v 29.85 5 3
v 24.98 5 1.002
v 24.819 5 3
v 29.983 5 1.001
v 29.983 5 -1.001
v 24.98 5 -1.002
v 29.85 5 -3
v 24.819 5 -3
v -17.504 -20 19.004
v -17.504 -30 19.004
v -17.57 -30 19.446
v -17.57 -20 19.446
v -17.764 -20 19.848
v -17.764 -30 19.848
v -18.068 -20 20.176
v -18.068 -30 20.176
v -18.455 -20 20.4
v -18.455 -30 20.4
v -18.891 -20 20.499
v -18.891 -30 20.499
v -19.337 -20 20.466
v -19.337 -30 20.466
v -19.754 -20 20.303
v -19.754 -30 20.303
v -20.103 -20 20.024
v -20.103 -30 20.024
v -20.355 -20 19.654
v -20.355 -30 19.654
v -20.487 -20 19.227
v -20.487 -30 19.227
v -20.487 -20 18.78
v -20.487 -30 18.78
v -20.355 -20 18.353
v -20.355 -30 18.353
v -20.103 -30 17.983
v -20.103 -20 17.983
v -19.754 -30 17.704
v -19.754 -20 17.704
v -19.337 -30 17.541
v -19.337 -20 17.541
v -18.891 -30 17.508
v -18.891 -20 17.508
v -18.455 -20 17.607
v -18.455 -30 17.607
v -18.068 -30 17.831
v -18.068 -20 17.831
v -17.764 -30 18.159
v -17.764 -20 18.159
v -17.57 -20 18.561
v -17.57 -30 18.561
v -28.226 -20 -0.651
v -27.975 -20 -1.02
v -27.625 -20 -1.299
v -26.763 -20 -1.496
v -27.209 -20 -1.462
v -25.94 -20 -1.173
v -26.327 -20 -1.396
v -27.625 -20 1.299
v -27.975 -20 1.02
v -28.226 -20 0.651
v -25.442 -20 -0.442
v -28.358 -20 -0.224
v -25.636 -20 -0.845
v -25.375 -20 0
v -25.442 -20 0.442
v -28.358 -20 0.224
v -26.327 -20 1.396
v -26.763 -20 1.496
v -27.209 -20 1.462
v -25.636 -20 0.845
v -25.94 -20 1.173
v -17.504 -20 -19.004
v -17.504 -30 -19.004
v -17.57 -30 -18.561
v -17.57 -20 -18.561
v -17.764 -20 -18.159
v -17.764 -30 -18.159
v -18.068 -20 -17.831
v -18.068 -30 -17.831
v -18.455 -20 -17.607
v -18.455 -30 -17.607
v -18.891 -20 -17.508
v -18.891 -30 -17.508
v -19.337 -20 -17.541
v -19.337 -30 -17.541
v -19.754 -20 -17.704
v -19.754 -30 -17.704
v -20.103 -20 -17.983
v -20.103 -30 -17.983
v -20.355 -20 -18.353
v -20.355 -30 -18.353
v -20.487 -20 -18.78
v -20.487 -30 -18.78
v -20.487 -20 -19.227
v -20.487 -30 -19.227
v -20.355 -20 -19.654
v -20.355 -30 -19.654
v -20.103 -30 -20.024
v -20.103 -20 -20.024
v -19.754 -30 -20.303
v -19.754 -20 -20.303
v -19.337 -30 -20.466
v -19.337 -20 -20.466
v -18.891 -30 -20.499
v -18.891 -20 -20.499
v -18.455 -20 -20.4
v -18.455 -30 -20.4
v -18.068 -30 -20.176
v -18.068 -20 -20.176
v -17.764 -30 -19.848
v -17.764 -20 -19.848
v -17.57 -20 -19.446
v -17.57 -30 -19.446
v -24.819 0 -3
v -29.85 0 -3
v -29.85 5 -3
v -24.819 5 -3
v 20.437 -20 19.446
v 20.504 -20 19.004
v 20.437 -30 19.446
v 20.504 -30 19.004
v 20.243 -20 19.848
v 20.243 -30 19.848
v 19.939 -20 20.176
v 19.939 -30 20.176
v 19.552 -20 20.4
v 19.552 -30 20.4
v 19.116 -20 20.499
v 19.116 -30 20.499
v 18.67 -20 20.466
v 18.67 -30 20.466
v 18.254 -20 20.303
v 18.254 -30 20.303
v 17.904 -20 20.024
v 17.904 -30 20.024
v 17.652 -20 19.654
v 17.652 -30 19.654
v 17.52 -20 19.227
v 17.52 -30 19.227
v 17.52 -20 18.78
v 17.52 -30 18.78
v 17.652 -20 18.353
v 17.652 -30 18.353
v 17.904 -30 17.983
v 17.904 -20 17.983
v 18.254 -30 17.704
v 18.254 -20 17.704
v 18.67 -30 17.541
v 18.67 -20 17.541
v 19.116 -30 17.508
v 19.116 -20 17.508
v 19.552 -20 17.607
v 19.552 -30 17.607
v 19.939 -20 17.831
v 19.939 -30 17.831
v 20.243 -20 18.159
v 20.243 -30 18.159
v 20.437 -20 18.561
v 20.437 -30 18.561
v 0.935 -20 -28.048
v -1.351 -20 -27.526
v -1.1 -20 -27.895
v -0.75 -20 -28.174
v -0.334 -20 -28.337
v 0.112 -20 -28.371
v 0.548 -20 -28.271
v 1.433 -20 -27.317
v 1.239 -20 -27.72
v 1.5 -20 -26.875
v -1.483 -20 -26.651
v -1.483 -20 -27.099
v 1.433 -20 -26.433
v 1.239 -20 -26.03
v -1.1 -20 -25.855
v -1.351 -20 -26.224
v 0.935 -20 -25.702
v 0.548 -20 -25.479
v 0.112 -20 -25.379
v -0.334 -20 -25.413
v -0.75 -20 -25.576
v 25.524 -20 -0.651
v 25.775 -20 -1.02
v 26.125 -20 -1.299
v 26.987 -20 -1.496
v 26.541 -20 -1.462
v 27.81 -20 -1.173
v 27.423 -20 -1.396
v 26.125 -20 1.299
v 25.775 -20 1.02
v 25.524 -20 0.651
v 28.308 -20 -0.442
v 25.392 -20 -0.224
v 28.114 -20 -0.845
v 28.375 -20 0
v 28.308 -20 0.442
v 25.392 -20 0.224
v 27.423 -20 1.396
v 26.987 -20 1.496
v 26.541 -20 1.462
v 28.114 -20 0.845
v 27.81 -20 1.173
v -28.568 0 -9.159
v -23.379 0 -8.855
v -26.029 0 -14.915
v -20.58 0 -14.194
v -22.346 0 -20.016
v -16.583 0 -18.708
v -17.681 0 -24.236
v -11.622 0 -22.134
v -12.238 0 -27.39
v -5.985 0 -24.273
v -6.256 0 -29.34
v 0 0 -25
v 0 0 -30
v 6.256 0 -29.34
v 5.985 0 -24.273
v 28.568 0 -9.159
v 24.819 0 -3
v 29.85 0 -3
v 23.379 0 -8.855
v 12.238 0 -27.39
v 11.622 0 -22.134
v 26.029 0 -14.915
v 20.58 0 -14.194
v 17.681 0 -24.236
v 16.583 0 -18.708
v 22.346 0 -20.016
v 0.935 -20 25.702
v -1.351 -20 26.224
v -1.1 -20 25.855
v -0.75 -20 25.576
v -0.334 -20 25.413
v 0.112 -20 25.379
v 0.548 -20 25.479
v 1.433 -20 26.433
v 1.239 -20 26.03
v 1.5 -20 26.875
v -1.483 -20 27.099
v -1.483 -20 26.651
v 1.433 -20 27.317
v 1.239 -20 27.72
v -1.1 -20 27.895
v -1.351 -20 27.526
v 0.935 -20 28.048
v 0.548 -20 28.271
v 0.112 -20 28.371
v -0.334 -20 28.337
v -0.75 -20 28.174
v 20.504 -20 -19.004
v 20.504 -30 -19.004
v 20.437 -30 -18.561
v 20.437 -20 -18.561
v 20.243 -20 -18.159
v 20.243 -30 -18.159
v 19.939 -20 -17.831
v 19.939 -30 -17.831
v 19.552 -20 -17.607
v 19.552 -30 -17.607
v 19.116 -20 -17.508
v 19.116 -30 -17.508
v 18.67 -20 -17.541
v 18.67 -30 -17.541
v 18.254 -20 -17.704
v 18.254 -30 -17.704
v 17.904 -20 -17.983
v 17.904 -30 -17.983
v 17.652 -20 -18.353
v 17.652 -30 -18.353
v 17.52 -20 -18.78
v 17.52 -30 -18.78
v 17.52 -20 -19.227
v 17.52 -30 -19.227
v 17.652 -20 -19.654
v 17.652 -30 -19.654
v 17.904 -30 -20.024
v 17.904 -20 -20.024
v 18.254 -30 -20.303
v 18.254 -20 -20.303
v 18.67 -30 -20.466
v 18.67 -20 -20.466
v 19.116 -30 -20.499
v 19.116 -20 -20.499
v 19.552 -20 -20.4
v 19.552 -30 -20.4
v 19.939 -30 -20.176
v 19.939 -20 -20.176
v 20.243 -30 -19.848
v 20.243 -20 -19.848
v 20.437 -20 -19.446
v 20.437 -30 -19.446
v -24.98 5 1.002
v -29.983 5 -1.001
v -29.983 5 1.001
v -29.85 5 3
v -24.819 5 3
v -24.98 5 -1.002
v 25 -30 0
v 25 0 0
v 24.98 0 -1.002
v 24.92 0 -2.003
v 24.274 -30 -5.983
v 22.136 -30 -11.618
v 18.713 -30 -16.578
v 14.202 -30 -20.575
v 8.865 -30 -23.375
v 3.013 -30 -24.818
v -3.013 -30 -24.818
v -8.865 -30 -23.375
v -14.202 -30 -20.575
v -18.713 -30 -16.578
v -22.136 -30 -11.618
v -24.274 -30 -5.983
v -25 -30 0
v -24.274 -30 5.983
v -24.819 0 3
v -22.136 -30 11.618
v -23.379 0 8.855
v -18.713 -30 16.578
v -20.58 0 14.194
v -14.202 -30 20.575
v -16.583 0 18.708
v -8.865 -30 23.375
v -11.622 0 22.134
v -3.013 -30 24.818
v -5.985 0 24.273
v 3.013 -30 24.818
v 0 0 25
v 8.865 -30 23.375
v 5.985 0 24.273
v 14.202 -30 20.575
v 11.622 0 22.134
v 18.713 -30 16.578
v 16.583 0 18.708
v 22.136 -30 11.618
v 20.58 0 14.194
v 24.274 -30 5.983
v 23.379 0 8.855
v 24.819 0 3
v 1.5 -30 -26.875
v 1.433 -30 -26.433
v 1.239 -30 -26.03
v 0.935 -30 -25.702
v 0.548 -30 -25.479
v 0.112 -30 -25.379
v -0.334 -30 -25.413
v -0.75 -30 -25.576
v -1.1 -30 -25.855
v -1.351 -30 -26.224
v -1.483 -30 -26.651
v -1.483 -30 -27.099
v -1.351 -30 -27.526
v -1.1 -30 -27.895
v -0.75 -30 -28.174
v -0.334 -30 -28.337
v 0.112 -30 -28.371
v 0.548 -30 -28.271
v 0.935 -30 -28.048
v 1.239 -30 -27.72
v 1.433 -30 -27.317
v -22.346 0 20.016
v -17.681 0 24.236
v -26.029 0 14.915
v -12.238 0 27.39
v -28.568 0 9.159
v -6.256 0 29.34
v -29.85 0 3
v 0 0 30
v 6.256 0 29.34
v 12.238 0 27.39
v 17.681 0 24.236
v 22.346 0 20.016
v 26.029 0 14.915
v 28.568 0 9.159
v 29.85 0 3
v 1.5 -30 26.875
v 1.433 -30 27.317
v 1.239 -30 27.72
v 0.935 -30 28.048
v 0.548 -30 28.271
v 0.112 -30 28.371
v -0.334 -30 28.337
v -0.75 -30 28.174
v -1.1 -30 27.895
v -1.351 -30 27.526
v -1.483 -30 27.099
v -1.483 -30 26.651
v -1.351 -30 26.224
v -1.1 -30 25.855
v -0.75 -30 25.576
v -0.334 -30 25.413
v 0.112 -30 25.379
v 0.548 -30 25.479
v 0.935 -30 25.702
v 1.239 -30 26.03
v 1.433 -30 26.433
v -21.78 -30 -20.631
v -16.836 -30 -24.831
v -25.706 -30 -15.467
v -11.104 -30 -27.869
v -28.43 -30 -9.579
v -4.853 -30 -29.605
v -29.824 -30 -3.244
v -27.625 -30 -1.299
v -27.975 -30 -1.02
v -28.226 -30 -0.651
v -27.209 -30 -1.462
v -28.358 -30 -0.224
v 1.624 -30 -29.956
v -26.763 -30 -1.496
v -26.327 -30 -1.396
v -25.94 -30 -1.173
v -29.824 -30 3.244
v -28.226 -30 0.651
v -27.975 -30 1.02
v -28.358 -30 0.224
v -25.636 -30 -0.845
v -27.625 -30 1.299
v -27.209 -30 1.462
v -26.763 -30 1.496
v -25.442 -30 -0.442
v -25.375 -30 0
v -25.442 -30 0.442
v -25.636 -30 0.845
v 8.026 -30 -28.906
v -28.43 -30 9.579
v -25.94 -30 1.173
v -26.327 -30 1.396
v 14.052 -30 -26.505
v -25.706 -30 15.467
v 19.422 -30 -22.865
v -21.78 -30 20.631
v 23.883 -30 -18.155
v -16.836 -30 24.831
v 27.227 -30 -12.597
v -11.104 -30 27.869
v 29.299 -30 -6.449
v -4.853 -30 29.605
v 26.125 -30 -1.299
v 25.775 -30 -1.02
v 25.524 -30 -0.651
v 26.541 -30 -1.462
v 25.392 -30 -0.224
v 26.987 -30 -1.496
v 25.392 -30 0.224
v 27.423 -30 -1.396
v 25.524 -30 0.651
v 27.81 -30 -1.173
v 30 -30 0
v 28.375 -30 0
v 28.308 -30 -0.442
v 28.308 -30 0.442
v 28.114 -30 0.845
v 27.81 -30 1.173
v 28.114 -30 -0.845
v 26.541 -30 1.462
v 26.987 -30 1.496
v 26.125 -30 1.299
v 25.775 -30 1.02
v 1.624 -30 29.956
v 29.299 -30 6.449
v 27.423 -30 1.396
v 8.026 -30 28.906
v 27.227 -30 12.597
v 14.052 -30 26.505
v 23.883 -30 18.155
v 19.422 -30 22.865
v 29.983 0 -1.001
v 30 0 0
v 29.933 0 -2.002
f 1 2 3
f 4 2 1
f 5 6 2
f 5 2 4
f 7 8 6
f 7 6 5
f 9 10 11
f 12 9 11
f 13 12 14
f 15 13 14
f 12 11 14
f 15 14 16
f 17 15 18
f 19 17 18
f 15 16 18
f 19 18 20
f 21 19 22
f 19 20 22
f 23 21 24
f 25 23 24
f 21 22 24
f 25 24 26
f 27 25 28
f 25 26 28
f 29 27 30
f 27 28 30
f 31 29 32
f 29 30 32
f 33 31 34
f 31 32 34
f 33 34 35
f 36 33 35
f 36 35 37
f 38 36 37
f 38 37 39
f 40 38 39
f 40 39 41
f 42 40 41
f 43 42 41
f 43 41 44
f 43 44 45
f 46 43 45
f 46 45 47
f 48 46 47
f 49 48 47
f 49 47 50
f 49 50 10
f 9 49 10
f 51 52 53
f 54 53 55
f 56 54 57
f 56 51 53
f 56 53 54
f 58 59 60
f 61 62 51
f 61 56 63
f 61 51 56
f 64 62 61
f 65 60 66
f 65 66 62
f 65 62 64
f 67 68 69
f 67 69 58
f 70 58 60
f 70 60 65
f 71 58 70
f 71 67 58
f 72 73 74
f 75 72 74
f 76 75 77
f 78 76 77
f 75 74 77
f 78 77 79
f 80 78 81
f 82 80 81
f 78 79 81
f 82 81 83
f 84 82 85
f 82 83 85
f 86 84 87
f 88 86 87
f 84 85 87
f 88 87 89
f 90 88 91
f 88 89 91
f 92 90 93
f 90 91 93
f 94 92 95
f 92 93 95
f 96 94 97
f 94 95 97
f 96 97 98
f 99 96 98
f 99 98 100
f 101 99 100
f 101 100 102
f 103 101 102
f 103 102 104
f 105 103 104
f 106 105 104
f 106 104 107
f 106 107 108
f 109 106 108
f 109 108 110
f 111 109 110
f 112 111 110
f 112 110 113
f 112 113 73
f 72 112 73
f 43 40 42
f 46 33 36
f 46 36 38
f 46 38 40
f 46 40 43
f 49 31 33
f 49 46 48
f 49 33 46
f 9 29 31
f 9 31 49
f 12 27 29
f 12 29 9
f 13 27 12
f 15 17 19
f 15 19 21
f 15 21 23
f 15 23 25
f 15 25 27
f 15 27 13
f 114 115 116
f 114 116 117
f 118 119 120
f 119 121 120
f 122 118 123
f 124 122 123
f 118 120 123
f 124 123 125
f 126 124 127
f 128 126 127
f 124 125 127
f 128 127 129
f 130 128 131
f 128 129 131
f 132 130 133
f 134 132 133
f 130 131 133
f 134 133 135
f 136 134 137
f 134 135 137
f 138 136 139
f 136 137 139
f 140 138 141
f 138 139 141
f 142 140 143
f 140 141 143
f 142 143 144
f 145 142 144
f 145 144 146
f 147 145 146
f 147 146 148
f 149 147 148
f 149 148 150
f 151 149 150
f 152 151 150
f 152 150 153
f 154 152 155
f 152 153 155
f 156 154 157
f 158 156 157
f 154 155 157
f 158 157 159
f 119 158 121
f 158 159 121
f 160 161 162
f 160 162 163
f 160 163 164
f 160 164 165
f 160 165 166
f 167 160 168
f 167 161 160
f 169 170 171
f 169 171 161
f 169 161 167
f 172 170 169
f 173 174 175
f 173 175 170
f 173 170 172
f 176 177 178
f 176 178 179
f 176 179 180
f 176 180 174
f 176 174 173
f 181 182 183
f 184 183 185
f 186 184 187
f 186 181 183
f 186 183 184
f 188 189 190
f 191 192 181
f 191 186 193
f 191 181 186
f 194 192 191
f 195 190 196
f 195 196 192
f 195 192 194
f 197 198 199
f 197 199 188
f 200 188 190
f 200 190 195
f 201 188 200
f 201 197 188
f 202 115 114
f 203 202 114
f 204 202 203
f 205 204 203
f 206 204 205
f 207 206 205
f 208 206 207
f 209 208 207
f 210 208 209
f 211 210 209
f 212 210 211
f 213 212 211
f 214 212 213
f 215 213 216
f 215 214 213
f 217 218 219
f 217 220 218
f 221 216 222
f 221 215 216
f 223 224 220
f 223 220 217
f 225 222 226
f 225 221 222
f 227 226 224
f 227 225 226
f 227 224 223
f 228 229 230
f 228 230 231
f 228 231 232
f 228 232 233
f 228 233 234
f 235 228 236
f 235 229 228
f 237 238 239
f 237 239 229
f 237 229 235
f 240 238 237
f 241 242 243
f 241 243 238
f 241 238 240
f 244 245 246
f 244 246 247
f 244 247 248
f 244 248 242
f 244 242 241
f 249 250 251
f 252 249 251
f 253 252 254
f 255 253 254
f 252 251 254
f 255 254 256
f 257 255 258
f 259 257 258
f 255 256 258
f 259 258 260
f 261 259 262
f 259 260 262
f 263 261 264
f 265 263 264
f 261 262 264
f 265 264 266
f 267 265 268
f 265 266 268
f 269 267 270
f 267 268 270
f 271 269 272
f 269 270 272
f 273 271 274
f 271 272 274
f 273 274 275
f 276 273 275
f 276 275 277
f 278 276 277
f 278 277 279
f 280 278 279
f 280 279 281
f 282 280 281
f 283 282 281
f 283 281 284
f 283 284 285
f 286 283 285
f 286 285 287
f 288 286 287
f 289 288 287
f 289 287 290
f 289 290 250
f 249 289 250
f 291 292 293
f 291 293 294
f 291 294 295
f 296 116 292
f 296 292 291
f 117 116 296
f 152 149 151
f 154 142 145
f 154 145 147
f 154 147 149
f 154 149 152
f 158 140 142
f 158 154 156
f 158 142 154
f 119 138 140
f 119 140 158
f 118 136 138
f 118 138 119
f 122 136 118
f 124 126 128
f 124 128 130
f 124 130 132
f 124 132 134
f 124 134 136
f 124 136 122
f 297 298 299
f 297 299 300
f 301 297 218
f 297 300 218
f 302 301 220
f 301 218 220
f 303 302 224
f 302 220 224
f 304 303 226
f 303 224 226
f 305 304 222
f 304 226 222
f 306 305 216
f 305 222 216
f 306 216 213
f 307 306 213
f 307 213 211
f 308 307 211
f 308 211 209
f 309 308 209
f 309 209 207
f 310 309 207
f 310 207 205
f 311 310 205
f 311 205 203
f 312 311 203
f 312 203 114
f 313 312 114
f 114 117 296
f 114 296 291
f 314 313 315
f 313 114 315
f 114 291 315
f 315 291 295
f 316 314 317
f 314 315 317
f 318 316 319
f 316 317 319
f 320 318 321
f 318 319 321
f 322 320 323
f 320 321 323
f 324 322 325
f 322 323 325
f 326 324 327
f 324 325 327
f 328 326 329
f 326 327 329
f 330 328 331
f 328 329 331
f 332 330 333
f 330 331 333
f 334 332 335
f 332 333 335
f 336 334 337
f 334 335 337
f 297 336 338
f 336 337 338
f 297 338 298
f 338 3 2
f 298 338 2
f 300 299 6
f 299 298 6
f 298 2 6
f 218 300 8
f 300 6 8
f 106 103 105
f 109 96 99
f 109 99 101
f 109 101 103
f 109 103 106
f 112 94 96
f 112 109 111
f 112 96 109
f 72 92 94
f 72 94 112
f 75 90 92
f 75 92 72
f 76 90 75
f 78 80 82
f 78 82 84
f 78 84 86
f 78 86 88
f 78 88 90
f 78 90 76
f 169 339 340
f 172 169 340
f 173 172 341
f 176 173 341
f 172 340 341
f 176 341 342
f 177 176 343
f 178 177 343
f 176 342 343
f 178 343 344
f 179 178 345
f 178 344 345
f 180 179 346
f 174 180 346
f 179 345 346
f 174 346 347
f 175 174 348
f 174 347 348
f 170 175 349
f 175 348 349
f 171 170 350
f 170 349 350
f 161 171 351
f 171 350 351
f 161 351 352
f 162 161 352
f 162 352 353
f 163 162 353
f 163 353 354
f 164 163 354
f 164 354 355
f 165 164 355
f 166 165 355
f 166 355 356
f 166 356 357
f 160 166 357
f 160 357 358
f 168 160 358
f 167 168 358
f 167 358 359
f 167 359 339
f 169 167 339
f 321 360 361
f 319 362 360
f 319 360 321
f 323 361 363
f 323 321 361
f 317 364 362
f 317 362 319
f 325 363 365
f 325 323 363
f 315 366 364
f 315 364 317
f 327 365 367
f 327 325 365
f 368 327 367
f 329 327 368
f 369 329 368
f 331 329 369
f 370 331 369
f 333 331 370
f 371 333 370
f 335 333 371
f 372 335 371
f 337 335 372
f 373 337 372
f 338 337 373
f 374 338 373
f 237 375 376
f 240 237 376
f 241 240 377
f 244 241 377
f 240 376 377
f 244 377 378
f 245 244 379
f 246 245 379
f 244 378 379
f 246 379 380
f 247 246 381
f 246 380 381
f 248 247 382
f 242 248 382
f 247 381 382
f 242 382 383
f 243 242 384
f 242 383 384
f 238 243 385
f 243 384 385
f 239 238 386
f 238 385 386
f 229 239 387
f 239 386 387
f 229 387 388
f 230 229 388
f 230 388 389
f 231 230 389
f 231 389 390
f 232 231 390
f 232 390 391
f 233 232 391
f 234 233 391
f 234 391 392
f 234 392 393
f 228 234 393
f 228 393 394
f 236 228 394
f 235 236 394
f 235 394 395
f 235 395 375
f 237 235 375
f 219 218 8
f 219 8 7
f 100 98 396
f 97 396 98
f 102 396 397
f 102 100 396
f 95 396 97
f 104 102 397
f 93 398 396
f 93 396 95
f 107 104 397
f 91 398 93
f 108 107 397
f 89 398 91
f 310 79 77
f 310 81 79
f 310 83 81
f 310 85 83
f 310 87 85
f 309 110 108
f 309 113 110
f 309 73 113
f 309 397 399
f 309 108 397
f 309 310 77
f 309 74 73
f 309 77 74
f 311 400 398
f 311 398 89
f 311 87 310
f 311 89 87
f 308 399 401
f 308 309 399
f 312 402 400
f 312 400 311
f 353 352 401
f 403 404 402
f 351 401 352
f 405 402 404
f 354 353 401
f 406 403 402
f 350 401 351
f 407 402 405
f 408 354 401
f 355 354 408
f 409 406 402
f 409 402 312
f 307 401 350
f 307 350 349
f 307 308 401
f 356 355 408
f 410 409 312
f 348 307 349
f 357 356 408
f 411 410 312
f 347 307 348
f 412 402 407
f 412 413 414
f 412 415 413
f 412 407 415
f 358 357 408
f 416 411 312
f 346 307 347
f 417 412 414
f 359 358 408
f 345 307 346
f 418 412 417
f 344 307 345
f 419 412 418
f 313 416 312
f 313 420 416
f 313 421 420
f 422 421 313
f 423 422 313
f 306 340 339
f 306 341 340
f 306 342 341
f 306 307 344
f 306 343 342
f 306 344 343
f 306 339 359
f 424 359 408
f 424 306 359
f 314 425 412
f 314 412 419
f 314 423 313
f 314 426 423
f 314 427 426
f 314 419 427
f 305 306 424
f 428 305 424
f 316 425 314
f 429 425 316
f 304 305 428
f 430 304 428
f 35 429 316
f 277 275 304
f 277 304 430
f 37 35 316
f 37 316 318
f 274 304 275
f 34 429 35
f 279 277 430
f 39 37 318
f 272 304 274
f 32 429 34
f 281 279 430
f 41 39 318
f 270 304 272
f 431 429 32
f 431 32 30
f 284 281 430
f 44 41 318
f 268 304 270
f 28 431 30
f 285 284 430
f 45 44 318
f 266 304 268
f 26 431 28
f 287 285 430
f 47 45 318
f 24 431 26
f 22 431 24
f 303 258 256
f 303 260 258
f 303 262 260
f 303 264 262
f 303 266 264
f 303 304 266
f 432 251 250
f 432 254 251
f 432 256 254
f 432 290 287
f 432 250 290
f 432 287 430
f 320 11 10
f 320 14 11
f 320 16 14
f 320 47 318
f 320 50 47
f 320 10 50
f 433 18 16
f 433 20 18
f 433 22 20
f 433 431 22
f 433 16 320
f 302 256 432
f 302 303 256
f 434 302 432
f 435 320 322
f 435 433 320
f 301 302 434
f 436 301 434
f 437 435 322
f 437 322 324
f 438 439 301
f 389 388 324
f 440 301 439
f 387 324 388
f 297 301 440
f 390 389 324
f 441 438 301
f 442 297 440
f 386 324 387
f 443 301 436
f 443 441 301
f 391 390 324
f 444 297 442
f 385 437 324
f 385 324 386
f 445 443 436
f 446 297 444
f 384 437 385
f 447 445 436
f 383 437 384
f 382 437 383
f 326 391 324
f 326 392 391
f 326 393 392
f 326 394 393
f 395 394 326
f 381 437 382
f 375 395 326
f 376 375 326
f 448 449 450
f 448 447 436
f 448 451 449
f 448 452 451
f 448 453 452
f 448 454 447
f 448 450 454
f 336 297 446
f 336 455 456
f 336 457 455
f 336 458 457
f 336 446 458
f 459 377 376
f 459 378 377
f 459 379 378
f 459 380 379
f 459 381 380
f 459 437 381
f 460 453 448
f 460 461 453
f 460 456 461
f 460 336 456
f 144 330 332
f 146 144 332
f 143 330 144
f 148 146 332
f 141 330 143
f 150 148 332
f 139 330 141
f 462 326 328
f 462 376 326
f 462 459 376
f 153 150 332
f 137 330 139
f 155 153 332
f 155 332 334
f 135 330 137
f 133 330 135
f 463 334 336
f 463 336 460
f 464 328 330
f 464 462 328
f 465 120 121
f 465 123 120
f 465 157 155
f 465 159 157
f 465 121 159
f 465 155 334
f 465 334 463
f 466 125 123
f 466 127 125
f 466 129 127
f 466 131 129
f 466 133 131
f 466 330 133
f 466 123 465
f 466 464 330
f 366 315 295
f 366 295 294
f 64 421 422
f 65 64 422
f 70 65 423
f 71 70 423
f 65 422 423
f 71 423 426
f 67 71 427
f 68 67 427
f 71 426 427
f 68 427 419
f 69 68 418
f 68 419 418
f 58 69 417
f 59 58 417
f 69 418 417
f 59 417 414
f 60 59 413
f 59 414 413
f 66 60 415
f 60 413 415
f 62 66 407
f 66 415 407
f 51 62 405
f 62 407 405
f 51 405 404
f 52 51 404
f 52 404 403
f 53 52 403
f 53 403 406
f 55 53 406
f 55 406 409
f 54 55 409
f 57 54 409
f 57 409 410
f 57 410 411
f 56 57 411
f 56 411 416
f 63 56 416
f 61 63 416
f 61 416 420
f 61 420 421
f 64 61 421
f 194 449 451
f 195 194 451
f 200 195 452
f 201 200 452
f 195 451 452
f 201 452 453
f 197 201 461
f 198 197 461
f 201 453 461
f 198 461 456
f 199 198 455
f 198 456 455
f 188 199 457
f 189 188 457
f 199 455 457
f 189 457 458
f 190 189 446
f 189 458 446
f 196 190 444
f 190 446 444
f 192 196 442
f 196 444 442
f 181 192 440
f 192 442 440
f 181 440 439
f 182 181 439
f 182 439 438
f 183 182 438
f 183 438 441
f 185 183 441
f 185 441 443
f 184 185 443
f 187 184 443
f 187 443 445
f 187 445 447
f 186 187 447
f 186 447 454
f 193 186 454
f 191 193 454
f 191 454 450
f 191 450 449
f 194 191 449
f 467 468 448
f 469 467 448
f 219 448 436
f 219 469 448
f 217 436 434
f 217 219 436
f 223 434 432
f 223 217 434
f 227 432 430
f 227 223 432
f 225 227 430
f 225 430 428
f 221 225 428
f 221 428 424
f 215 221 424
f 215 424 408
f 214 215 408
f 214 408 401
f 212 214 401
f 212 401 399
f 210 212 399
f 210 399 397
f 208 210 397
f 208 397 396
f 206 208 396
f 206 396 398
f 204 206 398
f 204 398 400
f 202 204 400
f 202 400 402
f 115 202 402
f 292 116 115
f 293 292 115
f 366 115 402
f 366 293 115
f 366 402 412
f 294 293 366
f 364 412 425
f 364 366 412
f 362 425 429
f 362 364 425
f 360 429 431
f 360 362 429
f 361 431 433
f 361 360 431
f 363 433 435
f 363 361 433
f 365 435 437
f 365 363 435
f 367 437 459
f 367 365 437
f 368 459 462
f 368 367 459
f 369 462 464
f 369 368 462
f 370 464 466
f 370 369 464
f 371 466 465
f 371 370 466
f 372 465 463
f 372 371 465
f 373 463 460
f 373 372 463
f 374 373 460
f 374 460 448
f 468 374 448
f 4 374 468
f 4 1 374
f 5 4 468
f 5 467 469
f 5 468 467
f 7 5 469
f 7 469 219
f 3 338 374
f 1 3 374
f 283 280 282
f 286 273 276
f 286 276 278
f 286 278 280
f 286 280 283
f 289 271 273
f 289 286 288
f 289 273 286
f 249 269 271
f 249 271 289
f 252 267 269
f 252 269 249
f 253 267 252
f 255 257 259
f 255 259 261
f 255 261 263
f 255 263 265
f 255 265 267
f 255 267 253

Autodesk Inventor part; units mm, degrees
ref_plane "YZ Plane" through (0, 0, 0) normal (1, 0, 0) x (0, 1, 0)
ref_plane "XZ Plane" through (0, 0, 0) normal (0, 1, 0) x (-1, 0, 0)
ref_plane "XY Plane" through (0, 0, 0) normal (0, 0, 1) x (1, 0, 0)
sketch "Sketch1" plane through (0, 0, 0) normal (0, 1, 0) x (-1, 0, 0)
  line L0 (0, 0) -> (50, 0) construction
  line L1 (0, 0) -> (50, 0) construction
  line L2 (0, 0) -> (-36, 0)
  circle A0 centre (0, 0) radius 25
  line L3 (-60, -10) -> (-60, 10)
  circle A1 centre (0, 0) radius 61
  point P0 (62.509, -33.0548)
  point P1 (12.6591, 21.558)
  point P2 (24.4148, 5.3777)
  point P3 (24.4148, -5.3777)
  point P4 (-22.9129, 10)
  point P5 (-22.9129, -10)
  point P6 (12.6591, -21.558)
  dimension "d2" = 36
  dimension "d3" = 50
  dimension "d26" = 122
extrude "Extrusion1" add sketch "Sketch1" along normal blind 5 contours A0 | A1
sketch "Sketch2" plane through (0, 5, 0) normal (0, 1, 0) x (1, 0, 0)
  circle A0 centre (0, 0) radius 20
  dimension "d6" = 40
extrude "Extrusion2" cut sketch "Sketch2" against normal up to next
sketch "Sketch3" plane through (0, 5, 0) normal (0, 1, 0) x (1, 0, 0)
  line L0 (22.1416, 4) -> (20.8701, 4)
  line L1 (22.1416, -4) -> (20.8701, -4)
  line L2 (24.6779, 4) -> (22.1416, 4)
  line L3 (24.6779, -4) -> (22.1416, -4)
  line L4 (-15.5618, -16.2506) -> (-14.5332, -15.5032)
  line L5 (-15.5618, 16.2506) -> (-14.5332, 15.5032)
  line L6 (-20.2641, -9.7784) -> (-19.2354, -9.0311)
  line L7 (-17.6137, -17.7414) -> (-15.5618, -16.2506)
  line L8 (-22.316, -11.2693) -> (-20.2641, -9.7784)
  line L9 (-20.2641, 9.7784) -> (-19.2354, 9.0311)
  line L10 (-17.6137, 17.7414) -> (-15.5618, 16.2506)
  line L11 (-22.316, 11.2693) -> (-20.2641, 9.7784)
  line L12 (-23.5374, 22.0452) -> (-13.679, 22.0452) construction
  arc A0 (-17.6137, -17.7414) -> (24.6779, -4) centre (0, 0) ccw
  arc A1 (24.6779, 4) -> (-17.6137, 17.7414) centre (0, 0) ccw
  arc A2 (-22.316, 11.2693) -> (-22.316, -11.2693) centre (0, 0) ccw
  line L13 (20.8701, 4) -> (15.8701, 4)
  line L14 (15.8701, 4) -> (15.8701, -4)
  line L15 (15.8701, -4) -> (20.8701, -4)
  line L16 (-14.5332, 15.5032) -> (-10.4881, 12.5643)
  line L17 (-10.4881, 12.5643) -> (-15.1903, 6.0922)
  line L18 (-15.1903, 6.0922) -> (-19.2354, 9.0311)
  line L19 (-19.2354, -9.0311) -> (-15.1903, -6.0922)
  line L20 (-15.1903, -6.0922) -> (-10.4881, -12.5643)
  line L21 (-10.4881, -12.5643) -> (-14.5332, -15.5032)
  circle A3 centre (-22.5, 0) radius 1.5
  circle A4 centre (0, 22.5) radius 1.5
  circle A5 centre (18.2029, 13.2252) radius 1.5
  circle A6 centre (18.2029, -13.2252) radius 1.5
  circle A7 centre (0, -22.5) radius 1.5
  circle A8 centre (0, 0) radius 4
  line L22 (0, 0) -> (8, 0)
  line L23 (8, 0) -> (8, 7.5)
  line L24 (8, 0) -> (8, -7.5)
  circle A9 centre (8, -7.5) radius 2.5
  circle A10 centre (8, 7.5) radius 2.5
  point P0 (-23.5374, -22.0452)
  point P1 (-28.2397, -15.5731)
  dimension "d9" = 36
  dimension "d10" = 5
  dimension "d11" = 5
  dimension "d12" = 3
  dimension "d13" = 3
  dimension "d14" = 3
  dimension "d15" = 3
  dimension "d16" = 3
  dimension "d17" = 8
  dimension "d18" = 8
  dimension "d19" = 7.5
  dimension "d20" = 7.5
  dimension "d21" = 5
  dimension "d22" = 5
extrude "Extrusion3" cut sketch "Sketch3" against normal up to next contours A3 | A4 | A5 | A6 | A7
sketch "Sketch5" plane through (0, 5, 0) normal (0, 1, 0) x (1, 0, 0)
  line L0 (0, 0) -> (37.5601, 0) construction
  circle A0 centre (0, 0) radius 25
  line L1 (0, 0) -> (15.7675, -27.31)
  line L2 (0, 0) -> (31.5349, 0) construction
  line L3 (0, 0) -> (19.8269, 34.3411)
  line L4 (0, 0) -> (39.6537, 0) construction
  line L5 (12.5, 21.6506) -> (15, 25.9808)
  line L6 (12.5, -21.6506) -> (15, -25.9808)
  line L7 (15, -25.9808) -> (27.9904, -18.4808)
  line L8 (27.9904, -18.4808) -> (34.9904, -30.6051)
  line L9 (34.9904, -30.6051) -> (22, -38.1051)
  line L10 (22, -38.1051) -> (15, -25.9808)
  line L11 (22, -38.1051) -> (15, -25.9808)
  line L12 (15, -25.9808) -> (2.0096, -33.4808)
  line L13 (2.0096, -33.4808) -> (9.0096, -45.6051)
  line L14 (9.0096, -45.6051) -> (22, -38.1051)
  line L15 (15, 25.9808) -> (2.0096, 33.4808)
  line L16 (2.0096, 33.4808) -> (9.0096, 45.6051)
  line L17 (9.0096, 45.6051) -> (22, 38.1051)
  line L18 (22, 38.1051) -> (15, 25.9808)
  line L19 (22, 38.1051) -> (15, 25.9808)
  line L20 (15, 25.9808) -> (27.9904, 18.4808)
  line L21 (27.9904, 18.4808) -> (34.9904, 30.6051)
  line L22 (34.9904, 30.6051) -> (22, 38.1051)
  dimension "d41" = 50
  dimension "d47" = 60
  dimension "d48" = 60
  dimension "d49" = 5
  dimension "d50" = 5
  dimension "d51" = 15
  dimension "d52" = 14
  dimension "d53" = 15
  dimension "d54" = 15
  dimension "d55" = 14
  dimension "d56" = 15
extrude "Extrusion5" cut sketch "Sketch5" against normal up to next contours L7 L8 L9 L10 L1 | L1 L10 L14 L13 L12 | L15 L16 L17 L18 L3 | L3 L18 L22 L21 L20
sketch "Sketch6" plane through (0, 0, 0) normal (0, -1, 0) x (1, 0, 0)
  circle A0 centre (0, 0) radius 25
  circle A1 centre (0, 0) radius 28.75
  circle A2 centre (0, 0) radius 30
  dimension "d57" = 50
  dimension "d58" = 57.5
extrude "Extrusion6" add sketch "Sketch6" along normal blind 30 contours A1 | A2
sketch "Sketch7" plane through (0, -30, 0) normal (0, -1, 0) x (1, 0, 0)
  circle A0 centre (26.875, 0) radius 1.5
  circle A1 centre (0, -26.875) radius 1.5
  circle A2 centre (-26.875, 0) radius 1.5
  circle A3 centre (0, 26.875) radius 1.5
  circle A4 centre (19.0035, 19.0035) radius 1.5
  circle A5 centre (19.0035, -19.0035) radius 1.5
  circle A6 centre (-19.0035, -19.0035) radius 1.5
  circle A7 centre (-19.0035, 19.0035) radius 1.5
  dimension "d62" = 3
  dimension "d63" = 3
  dimension "d64" = 3
  dimension "d65" = 3
  dimension "d67" = 3
  dimension "d68" = 3
  dimension "d69" = 3
  dimension "d70" = 3
extrude "Extrusion7" cut sketch "Sketch7" against normal blind 10
sketch "Sketch8" plane through (0, 0, 0) normal (0, -1, 0) x (1, 0, 0)
  line L0 (-37.9479, -22.6265) -> (-41.4746, -17.7724)
  line L1 (-47.9467, -22.4747) -> (-44.42, -27.3288)
  line L2 (-31.2231, -27.6292) -> (-27.6611, -32.4577)
  circle A0 centre (-42.9473, -22.5506) radius 1.5
  circle A1 centre (-26.2405, -27.6816) radius 1.5
  line L3 (-29.7189, 33.9527) -> (-36.191, 38.655)
  line L4 (-39.7177, 33.8009) -> (-33.2456, 29.0986)
  line L5 (-29.4532, 16.4547) -> (-35.9253, 21.157)
  line L6 (41.5, 10) -> (33.5, 10)
  line L7 (33.5, 4) -> (41.5, 4)
  line L8 (44, -10) -> (52, -10)
  circle A2 centre (48, -7) radius 1.5
  circle A3 centre (37.5, 7) radius 1.5
  circle A4 centre (-34.7183, 33.8768) radius 1.5
  circle A5 centre (-34.4526, 16.3788) radius 1.5
  point P0 (0, 0)
  point P1 (0, 0)
  point P2 (-32.9799, 11.6006)
  point P3 (44, -4)
  dimension "d73" = 3
  dimension "d74" = 3
  dimension "d75" = 3
  dimension "d76" = 3
  dimension "d77" = 3
extrude "Extrusion8" cut sketch "Sketch8" against normal blind 5
sketch "Sketch9" plane through (0, 5, 0) normal (0, 1, 0) x (1, 0, 0)
  line L0 (2.0096, -33.4808) -> (27.9904, -18.4808) projected
  line L1 (9.0096, -45.6051) -> (2.0096, -33.4808)
  line L2 (2.0096, -33.4808) -> (-0.5885, -34.9808)
  line L3 (-0.5885, -34.9808) -> (6.4115, -47.1051)
  line L4 (6.4115, -47.1051) -> (9.0096, -45.6051)
  line L5 (2.0096, 33.4808) -> (9.0096, 45.6051) projected
  line L6 (2.0096, 33.4808) -> (9.0096, 45.6051)
  line L7 (9.0096, 45.6051) -> (6.4115, 47.1051)
  line L8 (6.4115, 47.1051) -> (-0.5885, 34.9808)
  line L9 (-0.5885, 34.9808) -> (2.0096, 33.4808)
  point P0 (0, 0)
  dimension "d80" = 3
  dimension "d81" = 3
extrude "Extrusion9" cut sketch "Sketch9" against normal blind 10
sketch "Sketch10" plane through (0, 0, 0) normal (0, -1, 0) x (1, 0, 0)
  line L0 (6.4115, 47.1051) -> (-9.1769, 56.1051)
  line L1 (-9.1769, 56.1051) -> (-16.1769, 43.9808)
  line L2 (-16.1769, 43.9808) -> (-0.5885, 34.9808)
  line L3 (-9.1769, 56.1051) -> (-11.1769, 52.641)
  line L4 (-16.1769, 43.9808) -> (-14.1769, 47.4449)
  line L5 (-0.5885, 34.9808) -> (1.4115, 38.4449)
  line L6 (1.4115, 38.4449) -> (-2.0526, 40.4449)
  line L7 (6.4115, 47.1051) -> (4.4115, 43.641)
  line L8 (-0.5885, 34.9808) -> (6.4115, 47.1051) projected
  line L9 (4.4115, 43.641) -> (0.9474, 45.641)
  line L10 (27.9904, -18.4808) -> (-0.5885, -34.9808) projected
  line L11 (-16.1769, -43.9808) -> (-9.1769, -56.1051)
  line L12 (6.4115, -47.1051) -> (-0.5885, -34.9808)
  line L13 (-16.1769, -43.9808) -> (-14.1769, -47.4449)
  line L14 (-14.1769, -47.4449) -> (-10.7128, -45.4449)
  line L15 (-9.1769, -56.1051) -> (-11.1769, -52.641)
  line L16 (6.4115, -47.1051) -> (4.4115, -43.641)
  line L17 (-0.5885, -34.9808) -> (6.4115, -47.1051) projected
  line L18 (-0.5885, -34.9808) -> (1.4115, -38.4449)
  line L19 (6.4115, 47.1051) -> (3.8135, 48.6051)
  line L20 (3.8135, 48.6051) -> (-3.1865, 36.4808)
  line L21 (3.8135, 48.6051) -> (-2.6817, 52.3551)
  line L22 (1.8135, 45.141) -> (-2.0836, 47.391)
  line L23 (-2.0836, 47.391) -> (-5.0836, 42.1949)
  line L24 (-0.5885, -34.9808) -> (1.4115, -38.4449)
  line L25 (6.4115, -47.1051) -> (4.4115, -43.641)
  circle A0 centre (-5.5836, -41.3288) radius 1.5
  circle A1 centre (-1.5836, -48.257) radius 1.5
  line L26 (-2.0836, 47.391) -> (-1.5836, 48.257)
  line L27 (-5.0836, 42.1949) -> (-5.5836, 41.3288)
  circle A2 centre (-1.5836, 48.257) radius 1.5
  circle A3 centre (-5.5836, 41.3288) radius 1.5
  point P0 (0, 0)
  dimension "d85" = 14
  dimension "d86" = 4
  dimension "d88" = 4
  dimension "d92" = 4
  dimension "d93" = 4
  dimension "d94" = 4
  dimension "d95" = 4
  dimension "d98" = 18
  dimension "d99" = 4
  dimension "d101" = 4
  dimension "d103" = 4
  dimension "d129" = 3
  dimension "d130" = 7.5
  dimension "d137" = 4.5
  dimension "d140" = 4
  dimension "d146" = 3
  dimension "d148" = 1
  dimension "d149" = 1
  dimension "d150" = 3
  dimension "d151" = 3
extrude "Extrusion13" cut sketch "Sketch10" against normal blind 10 contours A2 L23 L22 | L22 L23 A2 | A0 | A1 | A3
sketch "Sketch11" plane through (0, 5, 0) normal (0, 1, 0) x (1, 0, 0)
  circle A0 centre (0, 0) radius 61
extrude "Extrusion14" cut sketch "Sketch11" against normal blind 5
sketch "Sketch12" plane through (0, 0, 0) normal (0, 1, 0) x (1, 0, 0)
  circle A0 centre (0, 0) radius 30
  circle A1 centre (0, 0) radius 30 projected
  circle A2 centre (0, 0) radius 25
  circle A3 centre (0, 0) radius 25 projected
  line L0 (-25, -3) -> (-29.8496, -3)
  line L1 (-24.8193, -3) -> (-25, -3)
  line L2 (-25, 3) -> (-24.8193, 3)
  line L3 (-29.8496, 3) -> (-24.8193, 3)
  line L4 (24.8193, -3) -> (29.8496, -3)
  line L5 (24.8193, 3) -> (29.8496, 3)
extrude "Extrusion15" add sketch "Sketch12" along normal blind 5 contours A0 L4 A2 L5 | L3 L2 A2 L1 L0 A0
properties part number "upperBase1"
